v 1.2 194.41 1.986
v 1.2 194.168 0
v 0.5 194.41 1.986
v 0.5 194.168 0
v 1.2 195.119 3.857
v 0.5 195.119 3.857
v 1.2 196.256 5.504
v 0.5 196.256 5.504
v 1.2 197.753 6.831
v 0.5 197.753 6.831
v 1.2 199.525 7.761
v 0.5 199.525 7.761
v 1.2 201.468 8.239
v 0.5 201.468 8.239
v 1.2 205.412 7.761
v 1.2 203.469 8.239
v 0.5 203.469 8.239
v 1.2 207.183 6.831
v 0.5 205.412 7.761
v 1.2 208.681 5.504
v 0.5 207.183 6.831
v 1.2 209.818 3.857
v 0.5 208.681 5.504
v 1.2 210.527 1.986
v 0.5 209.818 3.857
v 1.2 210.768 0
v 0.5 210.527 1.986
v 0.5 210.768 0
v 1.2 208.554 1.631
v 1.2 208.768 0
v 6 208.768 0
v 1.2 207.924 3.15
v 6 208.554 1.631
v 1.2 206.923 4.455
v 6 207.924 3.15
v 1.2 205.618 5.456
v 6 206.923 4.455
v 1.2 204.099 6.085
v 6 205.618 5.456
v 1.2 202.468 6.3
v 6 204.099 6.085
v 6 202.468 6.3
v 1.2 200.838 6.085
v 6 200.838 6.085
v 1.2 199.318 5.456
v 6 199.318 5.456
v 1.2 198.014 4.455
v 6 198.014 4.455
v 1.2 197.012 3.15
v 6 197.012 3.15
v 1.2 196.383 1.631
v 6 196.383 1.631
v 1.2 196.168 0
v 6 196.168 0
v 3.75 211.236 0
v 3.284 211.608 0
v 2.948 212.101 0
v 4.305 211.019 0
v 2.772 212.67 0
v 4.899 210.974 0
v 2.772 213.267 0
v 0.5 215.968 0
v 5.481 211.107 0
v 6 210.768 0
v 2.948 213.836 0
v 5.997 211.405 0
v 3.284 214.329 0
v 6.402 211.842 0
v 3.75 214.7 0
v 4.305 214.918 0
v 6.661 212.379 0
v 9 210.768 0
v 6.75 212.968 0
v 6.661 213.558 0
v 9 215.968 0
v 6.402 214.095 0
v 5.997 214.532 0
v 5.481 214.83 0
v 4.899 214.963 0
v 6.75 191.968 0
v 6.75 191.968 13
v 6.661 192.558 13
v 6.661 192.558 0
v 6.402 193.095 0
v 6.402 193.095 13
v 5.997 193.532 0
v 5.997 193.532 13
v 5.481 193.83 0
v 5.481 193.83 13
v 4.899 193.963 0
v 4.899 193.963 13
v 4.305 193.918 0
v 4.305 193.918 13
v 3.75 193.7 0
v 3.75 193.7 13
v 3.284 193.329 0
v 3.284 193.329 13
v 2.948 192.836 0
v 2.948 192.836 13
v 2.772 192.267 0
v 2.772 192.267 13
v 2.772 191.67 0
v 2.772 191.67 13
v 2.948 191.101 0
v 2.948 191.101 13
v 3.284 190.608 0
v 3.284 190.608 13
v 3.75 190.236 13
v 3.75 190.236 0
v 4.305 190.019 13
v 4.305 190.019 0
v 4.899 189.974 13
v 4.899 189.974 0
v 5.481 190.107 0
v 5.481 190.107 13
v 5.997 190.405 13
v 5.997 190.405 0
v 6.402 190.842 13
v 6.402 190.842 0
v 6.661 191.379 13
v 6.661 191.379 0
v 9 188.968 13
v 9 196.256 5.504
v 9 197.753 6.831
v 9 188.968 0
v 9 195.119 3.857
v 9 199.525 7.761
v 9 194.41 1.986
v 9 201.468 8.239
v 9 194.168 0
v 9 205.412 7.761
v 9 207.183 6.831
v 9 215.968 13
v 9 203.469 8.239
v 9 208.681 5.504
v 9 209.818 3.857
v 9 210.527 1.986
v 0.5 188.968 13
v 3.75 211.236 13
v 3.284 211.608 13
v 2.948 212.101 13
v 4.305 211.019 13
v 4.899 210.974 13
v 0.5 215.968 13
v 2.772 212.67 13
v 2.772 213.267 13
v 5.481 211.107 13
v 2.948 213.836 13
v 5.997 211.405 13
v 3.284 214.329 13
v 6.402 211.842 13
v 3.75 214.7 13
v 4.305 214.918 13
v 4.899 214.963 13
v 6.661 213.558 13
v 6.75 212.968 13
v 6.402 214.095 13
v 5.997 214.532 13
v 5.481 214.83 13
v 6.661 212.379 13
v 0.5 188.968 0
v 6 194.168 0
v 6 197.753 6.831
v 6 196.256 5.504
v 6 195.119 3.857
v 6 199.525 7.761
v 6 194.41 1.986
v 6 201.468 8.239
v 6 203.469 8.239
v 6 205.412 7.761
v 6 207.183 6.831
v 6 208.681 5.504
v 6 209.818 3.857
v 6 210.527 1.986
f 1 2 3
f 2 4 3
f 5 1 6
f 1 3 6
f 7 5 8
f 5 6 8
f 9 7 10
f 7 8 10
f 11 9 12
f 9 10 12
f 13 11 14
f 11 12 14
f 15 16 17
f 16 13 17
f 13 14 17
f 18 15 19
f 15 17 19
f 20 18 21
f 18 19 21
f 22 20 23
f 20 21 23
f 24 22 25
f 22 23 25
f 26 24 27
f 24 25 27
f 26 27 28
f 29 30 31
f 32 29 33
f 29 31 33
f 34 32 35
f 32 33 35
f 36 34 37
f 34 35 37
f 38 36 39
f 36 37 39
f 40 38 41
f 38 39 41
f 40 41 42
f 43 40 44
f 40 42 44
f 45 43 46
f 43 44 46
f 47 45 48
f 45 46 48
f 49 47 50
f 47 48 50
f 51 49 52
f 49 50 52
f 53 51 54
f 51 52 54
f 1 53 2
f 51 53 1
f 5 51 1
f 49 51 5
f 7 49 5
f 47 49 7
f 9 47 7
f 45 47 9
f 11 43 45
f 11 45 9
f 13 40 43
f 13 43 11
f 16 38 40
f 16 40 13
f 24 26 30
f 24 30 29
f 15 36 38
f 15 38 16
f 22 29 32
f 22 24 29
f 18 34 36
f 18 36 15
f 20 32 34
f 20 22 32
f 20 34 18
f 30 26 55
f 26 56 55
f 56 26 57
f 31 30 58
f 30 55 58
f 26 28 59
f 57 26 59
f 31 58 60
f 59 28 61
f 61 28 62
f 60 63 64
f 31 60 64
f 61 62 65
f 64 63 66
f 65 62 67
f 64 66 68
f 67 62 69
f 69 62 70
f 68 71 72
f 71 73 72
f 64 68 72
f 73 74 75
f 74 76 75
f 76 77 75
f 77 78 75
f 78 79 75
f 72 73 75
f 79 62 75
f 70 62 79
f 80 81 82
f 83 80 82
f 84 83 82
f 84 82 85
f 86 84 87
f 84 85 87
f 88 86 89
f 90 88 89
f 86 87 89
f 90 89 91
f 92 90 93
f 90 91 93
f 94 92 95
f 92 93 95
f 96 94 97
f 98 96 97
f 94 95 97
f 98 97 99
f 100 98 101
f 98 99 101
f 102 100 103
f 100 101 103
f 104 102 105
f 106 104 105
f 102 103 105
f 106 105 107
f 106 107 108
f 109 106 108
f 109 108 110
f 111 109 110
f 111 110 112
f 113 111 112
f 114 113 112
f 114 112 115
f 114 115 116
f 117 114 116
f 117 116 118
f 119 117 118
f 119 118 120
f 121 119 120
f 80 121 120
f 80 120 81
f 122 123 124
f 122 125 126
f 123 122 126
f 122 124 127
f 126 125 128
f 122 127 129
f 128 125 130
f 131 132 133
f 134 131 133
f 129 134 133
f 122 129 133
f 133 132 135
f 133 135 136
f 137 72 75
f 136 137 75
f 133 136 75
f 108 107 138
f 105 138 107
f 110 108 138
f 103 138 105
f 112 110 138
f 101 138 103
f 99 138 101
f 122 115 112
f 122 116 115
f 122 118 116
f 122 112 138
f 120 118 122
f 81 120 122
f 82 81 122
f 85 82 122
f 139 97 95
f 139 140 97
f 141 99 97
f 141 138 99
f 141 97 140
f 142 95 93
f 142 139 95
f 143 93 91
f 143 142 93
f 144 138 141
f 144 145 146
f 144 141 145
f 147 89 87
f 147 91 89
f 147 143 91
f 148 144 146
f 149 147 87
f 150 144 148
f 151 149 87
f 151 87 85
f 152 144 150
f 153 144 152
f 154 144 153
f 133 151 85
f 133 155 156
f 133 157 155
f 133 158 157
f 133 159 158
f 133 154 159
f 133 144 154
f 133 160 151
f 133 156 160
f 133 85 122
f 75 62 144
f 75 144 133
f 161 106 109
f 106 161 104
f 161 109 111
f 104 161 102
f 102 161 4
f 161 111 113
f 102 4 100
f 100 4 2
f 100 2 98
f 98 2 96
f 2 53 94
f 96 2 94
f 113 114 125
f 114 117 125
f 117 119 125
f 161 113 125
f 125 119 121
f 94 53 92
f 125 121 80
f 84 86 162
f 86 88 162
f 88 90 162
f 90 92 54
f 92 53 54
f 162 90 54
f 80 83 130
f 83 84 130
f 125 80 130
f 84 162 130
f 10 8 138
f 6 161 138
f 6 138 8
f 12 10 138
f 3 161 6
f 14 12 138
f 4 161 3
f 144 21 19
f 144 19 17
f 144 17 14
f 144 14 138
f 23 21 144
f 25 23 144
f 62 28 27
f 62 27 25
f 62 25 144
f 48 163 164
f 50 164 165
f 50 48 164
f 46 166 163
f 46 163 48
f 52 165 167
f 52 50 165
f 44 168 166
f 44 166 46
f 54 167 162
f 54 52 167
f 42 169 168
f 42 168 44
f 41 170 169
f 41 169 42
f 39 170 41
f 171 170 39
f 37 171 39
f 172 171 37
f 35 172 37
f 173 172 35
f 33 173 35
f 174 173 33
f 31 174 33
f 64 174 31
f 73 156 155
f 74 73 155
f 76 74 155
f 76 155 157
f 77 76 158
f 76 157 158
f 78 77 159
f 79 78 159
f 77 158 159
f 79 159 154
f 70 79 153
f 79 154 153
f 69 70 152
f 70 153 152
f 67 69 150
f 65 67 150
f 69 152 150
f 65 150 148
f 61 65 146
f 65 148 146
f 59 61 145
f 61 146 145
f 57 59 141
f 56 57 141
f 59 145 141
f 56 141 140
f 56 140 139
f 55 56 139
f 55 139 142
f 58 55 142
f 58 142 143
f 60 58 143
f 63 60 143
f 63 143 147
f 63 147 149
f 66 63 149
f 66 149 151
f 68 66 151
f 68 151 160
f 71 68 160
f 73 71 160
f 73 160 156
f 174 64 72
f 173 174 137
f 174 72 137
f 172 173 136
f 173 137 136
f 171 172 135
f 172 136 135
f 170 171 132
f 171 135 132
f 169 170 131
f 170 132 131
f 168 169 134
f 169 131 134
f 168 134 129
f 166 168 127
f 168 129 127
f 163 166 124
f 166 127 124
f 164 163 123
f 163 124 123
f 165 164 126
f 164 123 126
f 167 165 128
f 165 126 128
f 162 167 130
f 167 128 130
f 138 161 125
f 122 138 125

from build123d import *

# Parameters (mm, degrees)
ESBO_O1_W                = 8.5
ESBO_O1_H                = 27
RESSALTO_EXTRUS_O1_DEPTH = 13
ESBO_O3_R                = 8.3
CORTE_EXTRUS_O1_DEPTH    = 3
ESBO_O4_R                = 6.3
CORTE_EXTRUS_O2_DEPTH    = 5
ESBO_O7_R                = 8.3
CORTE_EXTRUS_O3_DEPTH    = 0.7
ESBO_O8_R                = 2
CORTE_EXTRUS_O4_DEPTH    = 14


with BuildPart() as part:
    # Esboço1 → Ressalto-extrusão1 (new body)
    with BuildSketch(Plane.XY):
        with Locations((4.75, 202.468429513)):
            Rectangle(ESBO_O1_W, ESBO_O1_H)
    extrude(amount=RESSALTO_EXTRUS_O1_DEPTH)

    # Esboço3 → Corte-extrusão1 (cut)
    with BuildSketch(Plane(origin=(9, 0, 0), x_dir=(0, 0, -1), z_dir=(1, 0, 0))):
        with Locations((0, 202.468429513)):
            Circle(ESBO_O3_R)
    extrude(amount=-CORTE_EXTRUS_O1_DEPTH, mode=Mode.SUBTRACT)

    # Esboço4 → Corte-extrusão2 (cut)
    with BuildSketch(Plane(origin=(6, 0, 0), x_dir=(0, 0, -1), z_dir=(1, 0, 0))):
        with Locations((0, 202.468429513)):
            Circle(ESBO_O4_R)
    extrude(amount=-CORTE_EXTRUS_O2_DEPTH, mode=Mode.SUBTRACT)

    # Esboço7 → Corte-extrusão3 (cut)
    with BuildSketch(Plane.ZY.offset(-0.5)):
        with Locations((0, 202.468429513)):
            Circle(ESBO_O7_R)
    extrude(amount=-CORTE_EXTRUS_O3_DEPTH, mode=Mode.SUBTRACT)

    # Esboço8 → Corte-extrusão4 (cut, through all)
    with BuildSketch(Plane.XY.offset(13)):
        with Locations((4.75, 191.968429513)):
            Circle(ESBO_O8_R)
        with Locations((4.75, 212.968429513)):
            Circle(ESBO_O8_R)
    extrude(amount=-CORTE_EXTRUS_O4_DEPTH, mode=Mode.SUBTRACT)


solid = part.part
